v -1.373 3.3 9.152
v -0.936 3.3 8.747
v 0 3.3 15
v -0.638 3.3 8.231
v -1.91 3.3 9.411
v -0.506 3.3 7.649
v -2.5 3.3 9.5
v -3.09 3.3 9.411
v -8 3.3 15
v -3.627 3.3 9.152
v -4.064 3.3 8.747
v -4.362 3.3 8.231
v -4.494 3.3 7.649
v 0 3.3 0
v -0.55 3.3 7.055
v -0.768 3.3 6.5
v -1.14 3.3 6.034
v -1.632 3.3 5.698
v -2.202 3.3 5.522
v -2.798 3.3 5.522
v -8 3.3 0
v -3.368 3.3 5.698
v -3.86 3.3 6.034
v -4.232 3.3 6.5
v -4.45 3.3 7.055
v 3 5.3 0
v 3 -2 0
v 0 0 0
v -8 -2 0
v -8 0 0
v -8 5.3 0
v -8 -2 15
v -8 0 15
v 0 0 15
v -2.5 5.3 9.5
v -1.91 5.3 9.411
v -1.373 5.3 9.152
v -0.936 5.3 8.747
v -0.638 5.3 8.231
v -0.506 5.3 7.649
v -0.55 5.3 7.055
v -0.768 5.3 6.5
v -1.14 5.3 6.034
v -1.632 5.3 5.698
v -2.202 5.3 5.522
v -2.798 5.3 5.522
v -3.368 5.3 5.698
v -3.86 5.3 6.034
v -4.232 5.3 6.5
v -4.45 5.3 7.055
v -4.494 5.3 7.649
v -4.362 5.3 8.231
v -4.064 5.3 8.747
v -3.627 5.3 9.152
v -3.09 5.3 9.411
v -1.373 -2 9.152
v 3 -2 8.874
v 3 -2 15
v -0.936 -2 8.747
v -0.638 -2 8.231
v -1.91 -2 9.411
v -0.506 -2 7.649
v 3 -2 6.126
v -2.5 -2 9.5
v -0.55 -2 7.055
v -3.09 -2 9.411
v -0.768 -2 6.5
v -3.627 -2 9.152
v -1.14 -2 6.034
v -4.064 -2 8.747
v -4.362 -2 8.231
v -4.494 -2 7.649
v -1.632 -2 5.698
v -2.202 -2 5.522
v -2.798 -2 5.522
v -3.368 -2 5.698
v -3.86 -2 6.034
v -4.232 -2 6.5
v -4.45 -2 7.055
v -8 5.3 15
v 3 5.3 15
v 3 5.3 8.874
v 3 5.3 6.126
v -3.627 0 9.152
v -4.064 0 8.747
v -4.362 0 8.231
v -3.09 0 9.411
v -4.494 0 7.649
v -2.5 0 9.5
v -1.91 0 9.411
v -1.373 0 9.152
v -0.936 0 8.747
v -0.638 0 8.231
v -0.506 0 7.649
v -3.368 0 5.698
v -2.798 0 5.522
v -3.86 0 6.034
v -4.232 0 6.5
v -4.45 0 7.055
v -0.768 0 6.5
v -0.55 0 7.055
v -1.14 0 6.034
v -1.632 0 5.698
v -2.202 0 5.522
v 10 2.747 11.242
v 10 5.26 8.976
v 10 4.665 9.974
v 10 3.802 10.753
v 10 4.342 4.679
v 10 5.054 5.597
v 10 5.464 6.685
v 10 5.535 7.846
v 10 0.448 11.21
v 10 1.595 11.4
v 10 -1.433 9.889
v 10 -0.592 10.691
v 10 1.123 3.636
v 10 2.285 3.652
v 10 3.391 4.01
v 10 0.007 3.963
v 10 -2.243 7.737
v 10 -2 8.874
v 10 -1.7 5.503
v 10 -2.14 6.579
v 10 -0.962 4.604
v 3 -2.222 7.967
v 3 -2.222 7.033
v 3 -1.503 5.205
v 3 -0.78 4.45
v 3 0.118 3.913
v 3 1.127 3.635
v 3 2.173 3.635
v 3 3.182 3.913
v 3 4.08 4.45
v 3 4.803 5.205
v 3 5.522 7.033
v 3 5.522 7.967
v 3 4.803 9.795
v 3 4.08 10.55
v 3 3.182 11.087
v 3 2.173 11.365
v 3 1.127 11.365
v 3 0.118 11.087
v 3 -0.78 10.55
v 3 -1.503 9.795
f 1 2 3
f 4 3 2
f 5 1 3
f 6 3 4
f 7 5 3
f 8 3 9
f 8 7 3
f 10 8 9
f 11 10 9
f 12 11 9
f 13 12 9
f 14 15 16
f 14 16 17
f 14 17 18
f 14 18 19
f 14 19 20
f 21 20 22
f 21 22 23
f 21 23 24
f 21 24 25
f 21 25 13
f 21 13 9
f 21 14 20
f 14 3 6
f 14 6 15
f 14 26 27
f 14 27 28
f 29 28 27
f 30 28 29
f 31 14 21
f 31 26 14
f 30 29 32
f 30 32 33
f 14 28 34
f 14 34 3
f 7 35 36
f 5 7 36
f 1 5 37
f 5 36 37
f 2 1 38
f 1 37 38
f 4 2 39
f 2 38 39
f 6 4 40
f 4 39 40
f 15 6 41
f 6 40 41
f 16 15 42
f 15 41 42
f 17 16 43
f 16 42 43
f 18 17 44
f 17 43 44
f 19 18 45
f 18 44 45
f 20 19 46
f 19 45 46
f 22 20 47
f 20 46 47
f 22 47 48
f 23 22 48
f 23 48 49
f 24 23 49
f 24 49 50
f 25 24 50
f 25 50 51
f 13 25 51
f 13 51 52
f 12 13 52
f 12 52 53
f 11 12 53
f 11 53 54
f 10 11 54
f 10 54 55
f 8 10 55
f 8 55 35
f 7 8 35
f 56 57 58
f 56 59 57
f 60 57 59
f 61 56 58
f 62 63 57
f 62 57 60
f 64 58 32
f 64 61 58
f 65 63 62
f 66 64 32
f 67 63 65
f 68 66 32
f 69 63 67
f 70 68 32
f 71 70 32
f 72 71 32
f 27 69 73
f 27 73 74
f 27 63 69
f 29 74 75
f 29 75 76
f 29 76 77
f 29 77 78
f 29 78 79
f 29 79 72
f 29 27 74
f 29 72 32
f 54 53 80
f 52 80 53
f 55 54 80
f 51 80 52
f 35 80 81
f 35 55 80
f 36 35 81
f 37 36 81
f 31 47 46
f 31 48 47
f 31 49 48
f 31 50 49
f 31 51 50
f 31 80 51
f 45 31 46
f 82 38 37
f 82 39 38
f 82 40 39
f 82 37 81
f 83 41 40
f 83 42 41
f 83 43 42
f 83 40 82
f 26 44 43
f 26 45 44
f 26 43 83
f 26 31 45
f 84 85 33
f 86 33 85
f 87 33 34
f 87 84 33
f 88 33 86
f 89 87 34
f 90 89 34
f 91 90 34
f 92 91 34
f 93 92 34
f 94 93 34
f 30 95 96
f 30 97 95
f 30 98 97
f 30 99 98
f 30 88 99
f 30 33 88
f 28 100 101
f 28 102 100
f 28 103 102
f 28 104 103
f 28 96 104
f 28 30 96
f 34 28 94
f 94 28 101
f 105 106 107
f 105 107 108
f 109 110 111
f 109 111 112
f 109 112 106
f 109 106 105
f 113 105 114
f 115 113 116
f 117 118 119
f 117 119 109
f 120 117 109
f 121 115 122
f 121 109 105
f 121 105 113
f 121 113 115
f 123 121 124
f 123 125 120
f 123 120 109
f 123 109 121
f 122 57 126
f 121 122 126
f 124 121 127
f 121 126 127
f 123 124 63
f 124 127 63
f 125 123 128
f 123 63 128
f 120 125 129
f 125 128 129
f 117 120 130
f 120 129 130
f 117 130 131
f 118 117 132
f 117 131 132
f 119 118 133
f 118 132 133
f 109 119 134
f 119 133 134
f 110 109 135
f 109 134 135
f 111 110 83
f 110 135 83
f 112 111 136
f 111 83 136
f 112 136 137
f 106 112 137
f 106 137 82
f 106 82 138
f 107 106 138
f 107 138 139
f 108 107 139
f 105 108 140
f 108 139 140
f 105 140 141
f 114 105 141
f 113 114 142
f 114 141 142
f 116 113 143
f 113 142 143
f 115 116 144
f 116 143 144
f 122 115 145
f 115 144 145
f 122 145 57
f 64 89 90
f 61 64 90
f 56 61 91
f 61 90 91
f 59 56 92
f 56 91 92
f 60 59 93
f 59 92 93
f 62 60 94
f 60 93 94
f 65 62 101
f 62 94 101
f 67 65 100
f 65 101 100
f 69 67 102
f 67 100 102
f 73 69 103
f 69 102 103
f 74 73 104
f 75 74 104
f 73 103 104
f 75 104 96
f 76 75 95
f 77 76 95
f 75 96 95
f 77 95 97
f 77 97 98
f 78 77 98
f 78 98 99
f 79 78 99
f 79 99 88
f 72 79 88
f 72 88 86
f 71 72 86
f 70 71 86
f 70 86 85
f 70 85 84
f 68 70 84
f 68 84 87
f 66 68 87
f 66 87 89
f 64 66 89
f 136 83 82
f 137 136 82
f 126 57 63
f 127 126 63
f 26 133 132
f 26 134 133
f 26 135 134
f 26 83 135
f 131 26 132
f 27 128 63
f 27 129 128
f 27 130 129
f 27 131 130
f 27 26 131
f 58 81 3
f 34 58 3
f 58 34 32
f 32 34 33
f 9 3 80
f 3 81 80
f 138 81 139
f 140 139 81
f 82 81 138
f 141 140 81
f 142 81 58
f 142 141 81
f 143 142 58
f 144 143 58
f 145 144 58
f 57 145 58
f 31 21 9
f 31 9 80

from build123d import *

# Parameters (mm, degrees)
BOSS_EXTRUDE1_DEPTH = 15
SKETCH5_R           = 2
CUT_EXTRUDE1_DEPTH  = 19.501081049
SKETCH4_R           = 3.9
BOSS_EXTRUDE2_DEPTH = 7


with BuildPart() as part:
    # Sketch1 → Boss-Extrude1 (new body)
    with BuildSketch(Plane.XY):
        Polygon((-8, 3.3), (-8, 5.3), (3, 5.3), (3, -2), (-8, -2), (-8, 0), (0, 0), (0, 3.3), align=None)
    extrude(amount=BOSS_EXTRUDE1_DEPTH)

    # Sketch5 → Cut-Extrude1 (cut, through all)
    with BuildSketch(Plane(origin=(0, 5.3, 0), x_dir=(1, 0, 0), z_dir=(0, 1, 0))):
        with Locations(Location((-2.5, -7.5, 0), (0, 0, 270))):
            Circle(SKETCH5_R)
    extrude(amount=-CUT_EXTRUDE1_DEPTH, mode=Mode.SUBTRACT)

    # Sketch4 → Boss-Extrude2 (add)
    with BuildSketch(Plane(origin=(3, 0, 0), x_dir=(0, 0, -1), z_dir=(1, 0, 0))):
        with Locations(Location((-7.5, 1.65, 0), (0, 0, 249.37361895))):
            Circle(SKETCH4_R)
    extrude(amount=BOSS_EXTRUDE2_DEPTH)


solid = part.part
